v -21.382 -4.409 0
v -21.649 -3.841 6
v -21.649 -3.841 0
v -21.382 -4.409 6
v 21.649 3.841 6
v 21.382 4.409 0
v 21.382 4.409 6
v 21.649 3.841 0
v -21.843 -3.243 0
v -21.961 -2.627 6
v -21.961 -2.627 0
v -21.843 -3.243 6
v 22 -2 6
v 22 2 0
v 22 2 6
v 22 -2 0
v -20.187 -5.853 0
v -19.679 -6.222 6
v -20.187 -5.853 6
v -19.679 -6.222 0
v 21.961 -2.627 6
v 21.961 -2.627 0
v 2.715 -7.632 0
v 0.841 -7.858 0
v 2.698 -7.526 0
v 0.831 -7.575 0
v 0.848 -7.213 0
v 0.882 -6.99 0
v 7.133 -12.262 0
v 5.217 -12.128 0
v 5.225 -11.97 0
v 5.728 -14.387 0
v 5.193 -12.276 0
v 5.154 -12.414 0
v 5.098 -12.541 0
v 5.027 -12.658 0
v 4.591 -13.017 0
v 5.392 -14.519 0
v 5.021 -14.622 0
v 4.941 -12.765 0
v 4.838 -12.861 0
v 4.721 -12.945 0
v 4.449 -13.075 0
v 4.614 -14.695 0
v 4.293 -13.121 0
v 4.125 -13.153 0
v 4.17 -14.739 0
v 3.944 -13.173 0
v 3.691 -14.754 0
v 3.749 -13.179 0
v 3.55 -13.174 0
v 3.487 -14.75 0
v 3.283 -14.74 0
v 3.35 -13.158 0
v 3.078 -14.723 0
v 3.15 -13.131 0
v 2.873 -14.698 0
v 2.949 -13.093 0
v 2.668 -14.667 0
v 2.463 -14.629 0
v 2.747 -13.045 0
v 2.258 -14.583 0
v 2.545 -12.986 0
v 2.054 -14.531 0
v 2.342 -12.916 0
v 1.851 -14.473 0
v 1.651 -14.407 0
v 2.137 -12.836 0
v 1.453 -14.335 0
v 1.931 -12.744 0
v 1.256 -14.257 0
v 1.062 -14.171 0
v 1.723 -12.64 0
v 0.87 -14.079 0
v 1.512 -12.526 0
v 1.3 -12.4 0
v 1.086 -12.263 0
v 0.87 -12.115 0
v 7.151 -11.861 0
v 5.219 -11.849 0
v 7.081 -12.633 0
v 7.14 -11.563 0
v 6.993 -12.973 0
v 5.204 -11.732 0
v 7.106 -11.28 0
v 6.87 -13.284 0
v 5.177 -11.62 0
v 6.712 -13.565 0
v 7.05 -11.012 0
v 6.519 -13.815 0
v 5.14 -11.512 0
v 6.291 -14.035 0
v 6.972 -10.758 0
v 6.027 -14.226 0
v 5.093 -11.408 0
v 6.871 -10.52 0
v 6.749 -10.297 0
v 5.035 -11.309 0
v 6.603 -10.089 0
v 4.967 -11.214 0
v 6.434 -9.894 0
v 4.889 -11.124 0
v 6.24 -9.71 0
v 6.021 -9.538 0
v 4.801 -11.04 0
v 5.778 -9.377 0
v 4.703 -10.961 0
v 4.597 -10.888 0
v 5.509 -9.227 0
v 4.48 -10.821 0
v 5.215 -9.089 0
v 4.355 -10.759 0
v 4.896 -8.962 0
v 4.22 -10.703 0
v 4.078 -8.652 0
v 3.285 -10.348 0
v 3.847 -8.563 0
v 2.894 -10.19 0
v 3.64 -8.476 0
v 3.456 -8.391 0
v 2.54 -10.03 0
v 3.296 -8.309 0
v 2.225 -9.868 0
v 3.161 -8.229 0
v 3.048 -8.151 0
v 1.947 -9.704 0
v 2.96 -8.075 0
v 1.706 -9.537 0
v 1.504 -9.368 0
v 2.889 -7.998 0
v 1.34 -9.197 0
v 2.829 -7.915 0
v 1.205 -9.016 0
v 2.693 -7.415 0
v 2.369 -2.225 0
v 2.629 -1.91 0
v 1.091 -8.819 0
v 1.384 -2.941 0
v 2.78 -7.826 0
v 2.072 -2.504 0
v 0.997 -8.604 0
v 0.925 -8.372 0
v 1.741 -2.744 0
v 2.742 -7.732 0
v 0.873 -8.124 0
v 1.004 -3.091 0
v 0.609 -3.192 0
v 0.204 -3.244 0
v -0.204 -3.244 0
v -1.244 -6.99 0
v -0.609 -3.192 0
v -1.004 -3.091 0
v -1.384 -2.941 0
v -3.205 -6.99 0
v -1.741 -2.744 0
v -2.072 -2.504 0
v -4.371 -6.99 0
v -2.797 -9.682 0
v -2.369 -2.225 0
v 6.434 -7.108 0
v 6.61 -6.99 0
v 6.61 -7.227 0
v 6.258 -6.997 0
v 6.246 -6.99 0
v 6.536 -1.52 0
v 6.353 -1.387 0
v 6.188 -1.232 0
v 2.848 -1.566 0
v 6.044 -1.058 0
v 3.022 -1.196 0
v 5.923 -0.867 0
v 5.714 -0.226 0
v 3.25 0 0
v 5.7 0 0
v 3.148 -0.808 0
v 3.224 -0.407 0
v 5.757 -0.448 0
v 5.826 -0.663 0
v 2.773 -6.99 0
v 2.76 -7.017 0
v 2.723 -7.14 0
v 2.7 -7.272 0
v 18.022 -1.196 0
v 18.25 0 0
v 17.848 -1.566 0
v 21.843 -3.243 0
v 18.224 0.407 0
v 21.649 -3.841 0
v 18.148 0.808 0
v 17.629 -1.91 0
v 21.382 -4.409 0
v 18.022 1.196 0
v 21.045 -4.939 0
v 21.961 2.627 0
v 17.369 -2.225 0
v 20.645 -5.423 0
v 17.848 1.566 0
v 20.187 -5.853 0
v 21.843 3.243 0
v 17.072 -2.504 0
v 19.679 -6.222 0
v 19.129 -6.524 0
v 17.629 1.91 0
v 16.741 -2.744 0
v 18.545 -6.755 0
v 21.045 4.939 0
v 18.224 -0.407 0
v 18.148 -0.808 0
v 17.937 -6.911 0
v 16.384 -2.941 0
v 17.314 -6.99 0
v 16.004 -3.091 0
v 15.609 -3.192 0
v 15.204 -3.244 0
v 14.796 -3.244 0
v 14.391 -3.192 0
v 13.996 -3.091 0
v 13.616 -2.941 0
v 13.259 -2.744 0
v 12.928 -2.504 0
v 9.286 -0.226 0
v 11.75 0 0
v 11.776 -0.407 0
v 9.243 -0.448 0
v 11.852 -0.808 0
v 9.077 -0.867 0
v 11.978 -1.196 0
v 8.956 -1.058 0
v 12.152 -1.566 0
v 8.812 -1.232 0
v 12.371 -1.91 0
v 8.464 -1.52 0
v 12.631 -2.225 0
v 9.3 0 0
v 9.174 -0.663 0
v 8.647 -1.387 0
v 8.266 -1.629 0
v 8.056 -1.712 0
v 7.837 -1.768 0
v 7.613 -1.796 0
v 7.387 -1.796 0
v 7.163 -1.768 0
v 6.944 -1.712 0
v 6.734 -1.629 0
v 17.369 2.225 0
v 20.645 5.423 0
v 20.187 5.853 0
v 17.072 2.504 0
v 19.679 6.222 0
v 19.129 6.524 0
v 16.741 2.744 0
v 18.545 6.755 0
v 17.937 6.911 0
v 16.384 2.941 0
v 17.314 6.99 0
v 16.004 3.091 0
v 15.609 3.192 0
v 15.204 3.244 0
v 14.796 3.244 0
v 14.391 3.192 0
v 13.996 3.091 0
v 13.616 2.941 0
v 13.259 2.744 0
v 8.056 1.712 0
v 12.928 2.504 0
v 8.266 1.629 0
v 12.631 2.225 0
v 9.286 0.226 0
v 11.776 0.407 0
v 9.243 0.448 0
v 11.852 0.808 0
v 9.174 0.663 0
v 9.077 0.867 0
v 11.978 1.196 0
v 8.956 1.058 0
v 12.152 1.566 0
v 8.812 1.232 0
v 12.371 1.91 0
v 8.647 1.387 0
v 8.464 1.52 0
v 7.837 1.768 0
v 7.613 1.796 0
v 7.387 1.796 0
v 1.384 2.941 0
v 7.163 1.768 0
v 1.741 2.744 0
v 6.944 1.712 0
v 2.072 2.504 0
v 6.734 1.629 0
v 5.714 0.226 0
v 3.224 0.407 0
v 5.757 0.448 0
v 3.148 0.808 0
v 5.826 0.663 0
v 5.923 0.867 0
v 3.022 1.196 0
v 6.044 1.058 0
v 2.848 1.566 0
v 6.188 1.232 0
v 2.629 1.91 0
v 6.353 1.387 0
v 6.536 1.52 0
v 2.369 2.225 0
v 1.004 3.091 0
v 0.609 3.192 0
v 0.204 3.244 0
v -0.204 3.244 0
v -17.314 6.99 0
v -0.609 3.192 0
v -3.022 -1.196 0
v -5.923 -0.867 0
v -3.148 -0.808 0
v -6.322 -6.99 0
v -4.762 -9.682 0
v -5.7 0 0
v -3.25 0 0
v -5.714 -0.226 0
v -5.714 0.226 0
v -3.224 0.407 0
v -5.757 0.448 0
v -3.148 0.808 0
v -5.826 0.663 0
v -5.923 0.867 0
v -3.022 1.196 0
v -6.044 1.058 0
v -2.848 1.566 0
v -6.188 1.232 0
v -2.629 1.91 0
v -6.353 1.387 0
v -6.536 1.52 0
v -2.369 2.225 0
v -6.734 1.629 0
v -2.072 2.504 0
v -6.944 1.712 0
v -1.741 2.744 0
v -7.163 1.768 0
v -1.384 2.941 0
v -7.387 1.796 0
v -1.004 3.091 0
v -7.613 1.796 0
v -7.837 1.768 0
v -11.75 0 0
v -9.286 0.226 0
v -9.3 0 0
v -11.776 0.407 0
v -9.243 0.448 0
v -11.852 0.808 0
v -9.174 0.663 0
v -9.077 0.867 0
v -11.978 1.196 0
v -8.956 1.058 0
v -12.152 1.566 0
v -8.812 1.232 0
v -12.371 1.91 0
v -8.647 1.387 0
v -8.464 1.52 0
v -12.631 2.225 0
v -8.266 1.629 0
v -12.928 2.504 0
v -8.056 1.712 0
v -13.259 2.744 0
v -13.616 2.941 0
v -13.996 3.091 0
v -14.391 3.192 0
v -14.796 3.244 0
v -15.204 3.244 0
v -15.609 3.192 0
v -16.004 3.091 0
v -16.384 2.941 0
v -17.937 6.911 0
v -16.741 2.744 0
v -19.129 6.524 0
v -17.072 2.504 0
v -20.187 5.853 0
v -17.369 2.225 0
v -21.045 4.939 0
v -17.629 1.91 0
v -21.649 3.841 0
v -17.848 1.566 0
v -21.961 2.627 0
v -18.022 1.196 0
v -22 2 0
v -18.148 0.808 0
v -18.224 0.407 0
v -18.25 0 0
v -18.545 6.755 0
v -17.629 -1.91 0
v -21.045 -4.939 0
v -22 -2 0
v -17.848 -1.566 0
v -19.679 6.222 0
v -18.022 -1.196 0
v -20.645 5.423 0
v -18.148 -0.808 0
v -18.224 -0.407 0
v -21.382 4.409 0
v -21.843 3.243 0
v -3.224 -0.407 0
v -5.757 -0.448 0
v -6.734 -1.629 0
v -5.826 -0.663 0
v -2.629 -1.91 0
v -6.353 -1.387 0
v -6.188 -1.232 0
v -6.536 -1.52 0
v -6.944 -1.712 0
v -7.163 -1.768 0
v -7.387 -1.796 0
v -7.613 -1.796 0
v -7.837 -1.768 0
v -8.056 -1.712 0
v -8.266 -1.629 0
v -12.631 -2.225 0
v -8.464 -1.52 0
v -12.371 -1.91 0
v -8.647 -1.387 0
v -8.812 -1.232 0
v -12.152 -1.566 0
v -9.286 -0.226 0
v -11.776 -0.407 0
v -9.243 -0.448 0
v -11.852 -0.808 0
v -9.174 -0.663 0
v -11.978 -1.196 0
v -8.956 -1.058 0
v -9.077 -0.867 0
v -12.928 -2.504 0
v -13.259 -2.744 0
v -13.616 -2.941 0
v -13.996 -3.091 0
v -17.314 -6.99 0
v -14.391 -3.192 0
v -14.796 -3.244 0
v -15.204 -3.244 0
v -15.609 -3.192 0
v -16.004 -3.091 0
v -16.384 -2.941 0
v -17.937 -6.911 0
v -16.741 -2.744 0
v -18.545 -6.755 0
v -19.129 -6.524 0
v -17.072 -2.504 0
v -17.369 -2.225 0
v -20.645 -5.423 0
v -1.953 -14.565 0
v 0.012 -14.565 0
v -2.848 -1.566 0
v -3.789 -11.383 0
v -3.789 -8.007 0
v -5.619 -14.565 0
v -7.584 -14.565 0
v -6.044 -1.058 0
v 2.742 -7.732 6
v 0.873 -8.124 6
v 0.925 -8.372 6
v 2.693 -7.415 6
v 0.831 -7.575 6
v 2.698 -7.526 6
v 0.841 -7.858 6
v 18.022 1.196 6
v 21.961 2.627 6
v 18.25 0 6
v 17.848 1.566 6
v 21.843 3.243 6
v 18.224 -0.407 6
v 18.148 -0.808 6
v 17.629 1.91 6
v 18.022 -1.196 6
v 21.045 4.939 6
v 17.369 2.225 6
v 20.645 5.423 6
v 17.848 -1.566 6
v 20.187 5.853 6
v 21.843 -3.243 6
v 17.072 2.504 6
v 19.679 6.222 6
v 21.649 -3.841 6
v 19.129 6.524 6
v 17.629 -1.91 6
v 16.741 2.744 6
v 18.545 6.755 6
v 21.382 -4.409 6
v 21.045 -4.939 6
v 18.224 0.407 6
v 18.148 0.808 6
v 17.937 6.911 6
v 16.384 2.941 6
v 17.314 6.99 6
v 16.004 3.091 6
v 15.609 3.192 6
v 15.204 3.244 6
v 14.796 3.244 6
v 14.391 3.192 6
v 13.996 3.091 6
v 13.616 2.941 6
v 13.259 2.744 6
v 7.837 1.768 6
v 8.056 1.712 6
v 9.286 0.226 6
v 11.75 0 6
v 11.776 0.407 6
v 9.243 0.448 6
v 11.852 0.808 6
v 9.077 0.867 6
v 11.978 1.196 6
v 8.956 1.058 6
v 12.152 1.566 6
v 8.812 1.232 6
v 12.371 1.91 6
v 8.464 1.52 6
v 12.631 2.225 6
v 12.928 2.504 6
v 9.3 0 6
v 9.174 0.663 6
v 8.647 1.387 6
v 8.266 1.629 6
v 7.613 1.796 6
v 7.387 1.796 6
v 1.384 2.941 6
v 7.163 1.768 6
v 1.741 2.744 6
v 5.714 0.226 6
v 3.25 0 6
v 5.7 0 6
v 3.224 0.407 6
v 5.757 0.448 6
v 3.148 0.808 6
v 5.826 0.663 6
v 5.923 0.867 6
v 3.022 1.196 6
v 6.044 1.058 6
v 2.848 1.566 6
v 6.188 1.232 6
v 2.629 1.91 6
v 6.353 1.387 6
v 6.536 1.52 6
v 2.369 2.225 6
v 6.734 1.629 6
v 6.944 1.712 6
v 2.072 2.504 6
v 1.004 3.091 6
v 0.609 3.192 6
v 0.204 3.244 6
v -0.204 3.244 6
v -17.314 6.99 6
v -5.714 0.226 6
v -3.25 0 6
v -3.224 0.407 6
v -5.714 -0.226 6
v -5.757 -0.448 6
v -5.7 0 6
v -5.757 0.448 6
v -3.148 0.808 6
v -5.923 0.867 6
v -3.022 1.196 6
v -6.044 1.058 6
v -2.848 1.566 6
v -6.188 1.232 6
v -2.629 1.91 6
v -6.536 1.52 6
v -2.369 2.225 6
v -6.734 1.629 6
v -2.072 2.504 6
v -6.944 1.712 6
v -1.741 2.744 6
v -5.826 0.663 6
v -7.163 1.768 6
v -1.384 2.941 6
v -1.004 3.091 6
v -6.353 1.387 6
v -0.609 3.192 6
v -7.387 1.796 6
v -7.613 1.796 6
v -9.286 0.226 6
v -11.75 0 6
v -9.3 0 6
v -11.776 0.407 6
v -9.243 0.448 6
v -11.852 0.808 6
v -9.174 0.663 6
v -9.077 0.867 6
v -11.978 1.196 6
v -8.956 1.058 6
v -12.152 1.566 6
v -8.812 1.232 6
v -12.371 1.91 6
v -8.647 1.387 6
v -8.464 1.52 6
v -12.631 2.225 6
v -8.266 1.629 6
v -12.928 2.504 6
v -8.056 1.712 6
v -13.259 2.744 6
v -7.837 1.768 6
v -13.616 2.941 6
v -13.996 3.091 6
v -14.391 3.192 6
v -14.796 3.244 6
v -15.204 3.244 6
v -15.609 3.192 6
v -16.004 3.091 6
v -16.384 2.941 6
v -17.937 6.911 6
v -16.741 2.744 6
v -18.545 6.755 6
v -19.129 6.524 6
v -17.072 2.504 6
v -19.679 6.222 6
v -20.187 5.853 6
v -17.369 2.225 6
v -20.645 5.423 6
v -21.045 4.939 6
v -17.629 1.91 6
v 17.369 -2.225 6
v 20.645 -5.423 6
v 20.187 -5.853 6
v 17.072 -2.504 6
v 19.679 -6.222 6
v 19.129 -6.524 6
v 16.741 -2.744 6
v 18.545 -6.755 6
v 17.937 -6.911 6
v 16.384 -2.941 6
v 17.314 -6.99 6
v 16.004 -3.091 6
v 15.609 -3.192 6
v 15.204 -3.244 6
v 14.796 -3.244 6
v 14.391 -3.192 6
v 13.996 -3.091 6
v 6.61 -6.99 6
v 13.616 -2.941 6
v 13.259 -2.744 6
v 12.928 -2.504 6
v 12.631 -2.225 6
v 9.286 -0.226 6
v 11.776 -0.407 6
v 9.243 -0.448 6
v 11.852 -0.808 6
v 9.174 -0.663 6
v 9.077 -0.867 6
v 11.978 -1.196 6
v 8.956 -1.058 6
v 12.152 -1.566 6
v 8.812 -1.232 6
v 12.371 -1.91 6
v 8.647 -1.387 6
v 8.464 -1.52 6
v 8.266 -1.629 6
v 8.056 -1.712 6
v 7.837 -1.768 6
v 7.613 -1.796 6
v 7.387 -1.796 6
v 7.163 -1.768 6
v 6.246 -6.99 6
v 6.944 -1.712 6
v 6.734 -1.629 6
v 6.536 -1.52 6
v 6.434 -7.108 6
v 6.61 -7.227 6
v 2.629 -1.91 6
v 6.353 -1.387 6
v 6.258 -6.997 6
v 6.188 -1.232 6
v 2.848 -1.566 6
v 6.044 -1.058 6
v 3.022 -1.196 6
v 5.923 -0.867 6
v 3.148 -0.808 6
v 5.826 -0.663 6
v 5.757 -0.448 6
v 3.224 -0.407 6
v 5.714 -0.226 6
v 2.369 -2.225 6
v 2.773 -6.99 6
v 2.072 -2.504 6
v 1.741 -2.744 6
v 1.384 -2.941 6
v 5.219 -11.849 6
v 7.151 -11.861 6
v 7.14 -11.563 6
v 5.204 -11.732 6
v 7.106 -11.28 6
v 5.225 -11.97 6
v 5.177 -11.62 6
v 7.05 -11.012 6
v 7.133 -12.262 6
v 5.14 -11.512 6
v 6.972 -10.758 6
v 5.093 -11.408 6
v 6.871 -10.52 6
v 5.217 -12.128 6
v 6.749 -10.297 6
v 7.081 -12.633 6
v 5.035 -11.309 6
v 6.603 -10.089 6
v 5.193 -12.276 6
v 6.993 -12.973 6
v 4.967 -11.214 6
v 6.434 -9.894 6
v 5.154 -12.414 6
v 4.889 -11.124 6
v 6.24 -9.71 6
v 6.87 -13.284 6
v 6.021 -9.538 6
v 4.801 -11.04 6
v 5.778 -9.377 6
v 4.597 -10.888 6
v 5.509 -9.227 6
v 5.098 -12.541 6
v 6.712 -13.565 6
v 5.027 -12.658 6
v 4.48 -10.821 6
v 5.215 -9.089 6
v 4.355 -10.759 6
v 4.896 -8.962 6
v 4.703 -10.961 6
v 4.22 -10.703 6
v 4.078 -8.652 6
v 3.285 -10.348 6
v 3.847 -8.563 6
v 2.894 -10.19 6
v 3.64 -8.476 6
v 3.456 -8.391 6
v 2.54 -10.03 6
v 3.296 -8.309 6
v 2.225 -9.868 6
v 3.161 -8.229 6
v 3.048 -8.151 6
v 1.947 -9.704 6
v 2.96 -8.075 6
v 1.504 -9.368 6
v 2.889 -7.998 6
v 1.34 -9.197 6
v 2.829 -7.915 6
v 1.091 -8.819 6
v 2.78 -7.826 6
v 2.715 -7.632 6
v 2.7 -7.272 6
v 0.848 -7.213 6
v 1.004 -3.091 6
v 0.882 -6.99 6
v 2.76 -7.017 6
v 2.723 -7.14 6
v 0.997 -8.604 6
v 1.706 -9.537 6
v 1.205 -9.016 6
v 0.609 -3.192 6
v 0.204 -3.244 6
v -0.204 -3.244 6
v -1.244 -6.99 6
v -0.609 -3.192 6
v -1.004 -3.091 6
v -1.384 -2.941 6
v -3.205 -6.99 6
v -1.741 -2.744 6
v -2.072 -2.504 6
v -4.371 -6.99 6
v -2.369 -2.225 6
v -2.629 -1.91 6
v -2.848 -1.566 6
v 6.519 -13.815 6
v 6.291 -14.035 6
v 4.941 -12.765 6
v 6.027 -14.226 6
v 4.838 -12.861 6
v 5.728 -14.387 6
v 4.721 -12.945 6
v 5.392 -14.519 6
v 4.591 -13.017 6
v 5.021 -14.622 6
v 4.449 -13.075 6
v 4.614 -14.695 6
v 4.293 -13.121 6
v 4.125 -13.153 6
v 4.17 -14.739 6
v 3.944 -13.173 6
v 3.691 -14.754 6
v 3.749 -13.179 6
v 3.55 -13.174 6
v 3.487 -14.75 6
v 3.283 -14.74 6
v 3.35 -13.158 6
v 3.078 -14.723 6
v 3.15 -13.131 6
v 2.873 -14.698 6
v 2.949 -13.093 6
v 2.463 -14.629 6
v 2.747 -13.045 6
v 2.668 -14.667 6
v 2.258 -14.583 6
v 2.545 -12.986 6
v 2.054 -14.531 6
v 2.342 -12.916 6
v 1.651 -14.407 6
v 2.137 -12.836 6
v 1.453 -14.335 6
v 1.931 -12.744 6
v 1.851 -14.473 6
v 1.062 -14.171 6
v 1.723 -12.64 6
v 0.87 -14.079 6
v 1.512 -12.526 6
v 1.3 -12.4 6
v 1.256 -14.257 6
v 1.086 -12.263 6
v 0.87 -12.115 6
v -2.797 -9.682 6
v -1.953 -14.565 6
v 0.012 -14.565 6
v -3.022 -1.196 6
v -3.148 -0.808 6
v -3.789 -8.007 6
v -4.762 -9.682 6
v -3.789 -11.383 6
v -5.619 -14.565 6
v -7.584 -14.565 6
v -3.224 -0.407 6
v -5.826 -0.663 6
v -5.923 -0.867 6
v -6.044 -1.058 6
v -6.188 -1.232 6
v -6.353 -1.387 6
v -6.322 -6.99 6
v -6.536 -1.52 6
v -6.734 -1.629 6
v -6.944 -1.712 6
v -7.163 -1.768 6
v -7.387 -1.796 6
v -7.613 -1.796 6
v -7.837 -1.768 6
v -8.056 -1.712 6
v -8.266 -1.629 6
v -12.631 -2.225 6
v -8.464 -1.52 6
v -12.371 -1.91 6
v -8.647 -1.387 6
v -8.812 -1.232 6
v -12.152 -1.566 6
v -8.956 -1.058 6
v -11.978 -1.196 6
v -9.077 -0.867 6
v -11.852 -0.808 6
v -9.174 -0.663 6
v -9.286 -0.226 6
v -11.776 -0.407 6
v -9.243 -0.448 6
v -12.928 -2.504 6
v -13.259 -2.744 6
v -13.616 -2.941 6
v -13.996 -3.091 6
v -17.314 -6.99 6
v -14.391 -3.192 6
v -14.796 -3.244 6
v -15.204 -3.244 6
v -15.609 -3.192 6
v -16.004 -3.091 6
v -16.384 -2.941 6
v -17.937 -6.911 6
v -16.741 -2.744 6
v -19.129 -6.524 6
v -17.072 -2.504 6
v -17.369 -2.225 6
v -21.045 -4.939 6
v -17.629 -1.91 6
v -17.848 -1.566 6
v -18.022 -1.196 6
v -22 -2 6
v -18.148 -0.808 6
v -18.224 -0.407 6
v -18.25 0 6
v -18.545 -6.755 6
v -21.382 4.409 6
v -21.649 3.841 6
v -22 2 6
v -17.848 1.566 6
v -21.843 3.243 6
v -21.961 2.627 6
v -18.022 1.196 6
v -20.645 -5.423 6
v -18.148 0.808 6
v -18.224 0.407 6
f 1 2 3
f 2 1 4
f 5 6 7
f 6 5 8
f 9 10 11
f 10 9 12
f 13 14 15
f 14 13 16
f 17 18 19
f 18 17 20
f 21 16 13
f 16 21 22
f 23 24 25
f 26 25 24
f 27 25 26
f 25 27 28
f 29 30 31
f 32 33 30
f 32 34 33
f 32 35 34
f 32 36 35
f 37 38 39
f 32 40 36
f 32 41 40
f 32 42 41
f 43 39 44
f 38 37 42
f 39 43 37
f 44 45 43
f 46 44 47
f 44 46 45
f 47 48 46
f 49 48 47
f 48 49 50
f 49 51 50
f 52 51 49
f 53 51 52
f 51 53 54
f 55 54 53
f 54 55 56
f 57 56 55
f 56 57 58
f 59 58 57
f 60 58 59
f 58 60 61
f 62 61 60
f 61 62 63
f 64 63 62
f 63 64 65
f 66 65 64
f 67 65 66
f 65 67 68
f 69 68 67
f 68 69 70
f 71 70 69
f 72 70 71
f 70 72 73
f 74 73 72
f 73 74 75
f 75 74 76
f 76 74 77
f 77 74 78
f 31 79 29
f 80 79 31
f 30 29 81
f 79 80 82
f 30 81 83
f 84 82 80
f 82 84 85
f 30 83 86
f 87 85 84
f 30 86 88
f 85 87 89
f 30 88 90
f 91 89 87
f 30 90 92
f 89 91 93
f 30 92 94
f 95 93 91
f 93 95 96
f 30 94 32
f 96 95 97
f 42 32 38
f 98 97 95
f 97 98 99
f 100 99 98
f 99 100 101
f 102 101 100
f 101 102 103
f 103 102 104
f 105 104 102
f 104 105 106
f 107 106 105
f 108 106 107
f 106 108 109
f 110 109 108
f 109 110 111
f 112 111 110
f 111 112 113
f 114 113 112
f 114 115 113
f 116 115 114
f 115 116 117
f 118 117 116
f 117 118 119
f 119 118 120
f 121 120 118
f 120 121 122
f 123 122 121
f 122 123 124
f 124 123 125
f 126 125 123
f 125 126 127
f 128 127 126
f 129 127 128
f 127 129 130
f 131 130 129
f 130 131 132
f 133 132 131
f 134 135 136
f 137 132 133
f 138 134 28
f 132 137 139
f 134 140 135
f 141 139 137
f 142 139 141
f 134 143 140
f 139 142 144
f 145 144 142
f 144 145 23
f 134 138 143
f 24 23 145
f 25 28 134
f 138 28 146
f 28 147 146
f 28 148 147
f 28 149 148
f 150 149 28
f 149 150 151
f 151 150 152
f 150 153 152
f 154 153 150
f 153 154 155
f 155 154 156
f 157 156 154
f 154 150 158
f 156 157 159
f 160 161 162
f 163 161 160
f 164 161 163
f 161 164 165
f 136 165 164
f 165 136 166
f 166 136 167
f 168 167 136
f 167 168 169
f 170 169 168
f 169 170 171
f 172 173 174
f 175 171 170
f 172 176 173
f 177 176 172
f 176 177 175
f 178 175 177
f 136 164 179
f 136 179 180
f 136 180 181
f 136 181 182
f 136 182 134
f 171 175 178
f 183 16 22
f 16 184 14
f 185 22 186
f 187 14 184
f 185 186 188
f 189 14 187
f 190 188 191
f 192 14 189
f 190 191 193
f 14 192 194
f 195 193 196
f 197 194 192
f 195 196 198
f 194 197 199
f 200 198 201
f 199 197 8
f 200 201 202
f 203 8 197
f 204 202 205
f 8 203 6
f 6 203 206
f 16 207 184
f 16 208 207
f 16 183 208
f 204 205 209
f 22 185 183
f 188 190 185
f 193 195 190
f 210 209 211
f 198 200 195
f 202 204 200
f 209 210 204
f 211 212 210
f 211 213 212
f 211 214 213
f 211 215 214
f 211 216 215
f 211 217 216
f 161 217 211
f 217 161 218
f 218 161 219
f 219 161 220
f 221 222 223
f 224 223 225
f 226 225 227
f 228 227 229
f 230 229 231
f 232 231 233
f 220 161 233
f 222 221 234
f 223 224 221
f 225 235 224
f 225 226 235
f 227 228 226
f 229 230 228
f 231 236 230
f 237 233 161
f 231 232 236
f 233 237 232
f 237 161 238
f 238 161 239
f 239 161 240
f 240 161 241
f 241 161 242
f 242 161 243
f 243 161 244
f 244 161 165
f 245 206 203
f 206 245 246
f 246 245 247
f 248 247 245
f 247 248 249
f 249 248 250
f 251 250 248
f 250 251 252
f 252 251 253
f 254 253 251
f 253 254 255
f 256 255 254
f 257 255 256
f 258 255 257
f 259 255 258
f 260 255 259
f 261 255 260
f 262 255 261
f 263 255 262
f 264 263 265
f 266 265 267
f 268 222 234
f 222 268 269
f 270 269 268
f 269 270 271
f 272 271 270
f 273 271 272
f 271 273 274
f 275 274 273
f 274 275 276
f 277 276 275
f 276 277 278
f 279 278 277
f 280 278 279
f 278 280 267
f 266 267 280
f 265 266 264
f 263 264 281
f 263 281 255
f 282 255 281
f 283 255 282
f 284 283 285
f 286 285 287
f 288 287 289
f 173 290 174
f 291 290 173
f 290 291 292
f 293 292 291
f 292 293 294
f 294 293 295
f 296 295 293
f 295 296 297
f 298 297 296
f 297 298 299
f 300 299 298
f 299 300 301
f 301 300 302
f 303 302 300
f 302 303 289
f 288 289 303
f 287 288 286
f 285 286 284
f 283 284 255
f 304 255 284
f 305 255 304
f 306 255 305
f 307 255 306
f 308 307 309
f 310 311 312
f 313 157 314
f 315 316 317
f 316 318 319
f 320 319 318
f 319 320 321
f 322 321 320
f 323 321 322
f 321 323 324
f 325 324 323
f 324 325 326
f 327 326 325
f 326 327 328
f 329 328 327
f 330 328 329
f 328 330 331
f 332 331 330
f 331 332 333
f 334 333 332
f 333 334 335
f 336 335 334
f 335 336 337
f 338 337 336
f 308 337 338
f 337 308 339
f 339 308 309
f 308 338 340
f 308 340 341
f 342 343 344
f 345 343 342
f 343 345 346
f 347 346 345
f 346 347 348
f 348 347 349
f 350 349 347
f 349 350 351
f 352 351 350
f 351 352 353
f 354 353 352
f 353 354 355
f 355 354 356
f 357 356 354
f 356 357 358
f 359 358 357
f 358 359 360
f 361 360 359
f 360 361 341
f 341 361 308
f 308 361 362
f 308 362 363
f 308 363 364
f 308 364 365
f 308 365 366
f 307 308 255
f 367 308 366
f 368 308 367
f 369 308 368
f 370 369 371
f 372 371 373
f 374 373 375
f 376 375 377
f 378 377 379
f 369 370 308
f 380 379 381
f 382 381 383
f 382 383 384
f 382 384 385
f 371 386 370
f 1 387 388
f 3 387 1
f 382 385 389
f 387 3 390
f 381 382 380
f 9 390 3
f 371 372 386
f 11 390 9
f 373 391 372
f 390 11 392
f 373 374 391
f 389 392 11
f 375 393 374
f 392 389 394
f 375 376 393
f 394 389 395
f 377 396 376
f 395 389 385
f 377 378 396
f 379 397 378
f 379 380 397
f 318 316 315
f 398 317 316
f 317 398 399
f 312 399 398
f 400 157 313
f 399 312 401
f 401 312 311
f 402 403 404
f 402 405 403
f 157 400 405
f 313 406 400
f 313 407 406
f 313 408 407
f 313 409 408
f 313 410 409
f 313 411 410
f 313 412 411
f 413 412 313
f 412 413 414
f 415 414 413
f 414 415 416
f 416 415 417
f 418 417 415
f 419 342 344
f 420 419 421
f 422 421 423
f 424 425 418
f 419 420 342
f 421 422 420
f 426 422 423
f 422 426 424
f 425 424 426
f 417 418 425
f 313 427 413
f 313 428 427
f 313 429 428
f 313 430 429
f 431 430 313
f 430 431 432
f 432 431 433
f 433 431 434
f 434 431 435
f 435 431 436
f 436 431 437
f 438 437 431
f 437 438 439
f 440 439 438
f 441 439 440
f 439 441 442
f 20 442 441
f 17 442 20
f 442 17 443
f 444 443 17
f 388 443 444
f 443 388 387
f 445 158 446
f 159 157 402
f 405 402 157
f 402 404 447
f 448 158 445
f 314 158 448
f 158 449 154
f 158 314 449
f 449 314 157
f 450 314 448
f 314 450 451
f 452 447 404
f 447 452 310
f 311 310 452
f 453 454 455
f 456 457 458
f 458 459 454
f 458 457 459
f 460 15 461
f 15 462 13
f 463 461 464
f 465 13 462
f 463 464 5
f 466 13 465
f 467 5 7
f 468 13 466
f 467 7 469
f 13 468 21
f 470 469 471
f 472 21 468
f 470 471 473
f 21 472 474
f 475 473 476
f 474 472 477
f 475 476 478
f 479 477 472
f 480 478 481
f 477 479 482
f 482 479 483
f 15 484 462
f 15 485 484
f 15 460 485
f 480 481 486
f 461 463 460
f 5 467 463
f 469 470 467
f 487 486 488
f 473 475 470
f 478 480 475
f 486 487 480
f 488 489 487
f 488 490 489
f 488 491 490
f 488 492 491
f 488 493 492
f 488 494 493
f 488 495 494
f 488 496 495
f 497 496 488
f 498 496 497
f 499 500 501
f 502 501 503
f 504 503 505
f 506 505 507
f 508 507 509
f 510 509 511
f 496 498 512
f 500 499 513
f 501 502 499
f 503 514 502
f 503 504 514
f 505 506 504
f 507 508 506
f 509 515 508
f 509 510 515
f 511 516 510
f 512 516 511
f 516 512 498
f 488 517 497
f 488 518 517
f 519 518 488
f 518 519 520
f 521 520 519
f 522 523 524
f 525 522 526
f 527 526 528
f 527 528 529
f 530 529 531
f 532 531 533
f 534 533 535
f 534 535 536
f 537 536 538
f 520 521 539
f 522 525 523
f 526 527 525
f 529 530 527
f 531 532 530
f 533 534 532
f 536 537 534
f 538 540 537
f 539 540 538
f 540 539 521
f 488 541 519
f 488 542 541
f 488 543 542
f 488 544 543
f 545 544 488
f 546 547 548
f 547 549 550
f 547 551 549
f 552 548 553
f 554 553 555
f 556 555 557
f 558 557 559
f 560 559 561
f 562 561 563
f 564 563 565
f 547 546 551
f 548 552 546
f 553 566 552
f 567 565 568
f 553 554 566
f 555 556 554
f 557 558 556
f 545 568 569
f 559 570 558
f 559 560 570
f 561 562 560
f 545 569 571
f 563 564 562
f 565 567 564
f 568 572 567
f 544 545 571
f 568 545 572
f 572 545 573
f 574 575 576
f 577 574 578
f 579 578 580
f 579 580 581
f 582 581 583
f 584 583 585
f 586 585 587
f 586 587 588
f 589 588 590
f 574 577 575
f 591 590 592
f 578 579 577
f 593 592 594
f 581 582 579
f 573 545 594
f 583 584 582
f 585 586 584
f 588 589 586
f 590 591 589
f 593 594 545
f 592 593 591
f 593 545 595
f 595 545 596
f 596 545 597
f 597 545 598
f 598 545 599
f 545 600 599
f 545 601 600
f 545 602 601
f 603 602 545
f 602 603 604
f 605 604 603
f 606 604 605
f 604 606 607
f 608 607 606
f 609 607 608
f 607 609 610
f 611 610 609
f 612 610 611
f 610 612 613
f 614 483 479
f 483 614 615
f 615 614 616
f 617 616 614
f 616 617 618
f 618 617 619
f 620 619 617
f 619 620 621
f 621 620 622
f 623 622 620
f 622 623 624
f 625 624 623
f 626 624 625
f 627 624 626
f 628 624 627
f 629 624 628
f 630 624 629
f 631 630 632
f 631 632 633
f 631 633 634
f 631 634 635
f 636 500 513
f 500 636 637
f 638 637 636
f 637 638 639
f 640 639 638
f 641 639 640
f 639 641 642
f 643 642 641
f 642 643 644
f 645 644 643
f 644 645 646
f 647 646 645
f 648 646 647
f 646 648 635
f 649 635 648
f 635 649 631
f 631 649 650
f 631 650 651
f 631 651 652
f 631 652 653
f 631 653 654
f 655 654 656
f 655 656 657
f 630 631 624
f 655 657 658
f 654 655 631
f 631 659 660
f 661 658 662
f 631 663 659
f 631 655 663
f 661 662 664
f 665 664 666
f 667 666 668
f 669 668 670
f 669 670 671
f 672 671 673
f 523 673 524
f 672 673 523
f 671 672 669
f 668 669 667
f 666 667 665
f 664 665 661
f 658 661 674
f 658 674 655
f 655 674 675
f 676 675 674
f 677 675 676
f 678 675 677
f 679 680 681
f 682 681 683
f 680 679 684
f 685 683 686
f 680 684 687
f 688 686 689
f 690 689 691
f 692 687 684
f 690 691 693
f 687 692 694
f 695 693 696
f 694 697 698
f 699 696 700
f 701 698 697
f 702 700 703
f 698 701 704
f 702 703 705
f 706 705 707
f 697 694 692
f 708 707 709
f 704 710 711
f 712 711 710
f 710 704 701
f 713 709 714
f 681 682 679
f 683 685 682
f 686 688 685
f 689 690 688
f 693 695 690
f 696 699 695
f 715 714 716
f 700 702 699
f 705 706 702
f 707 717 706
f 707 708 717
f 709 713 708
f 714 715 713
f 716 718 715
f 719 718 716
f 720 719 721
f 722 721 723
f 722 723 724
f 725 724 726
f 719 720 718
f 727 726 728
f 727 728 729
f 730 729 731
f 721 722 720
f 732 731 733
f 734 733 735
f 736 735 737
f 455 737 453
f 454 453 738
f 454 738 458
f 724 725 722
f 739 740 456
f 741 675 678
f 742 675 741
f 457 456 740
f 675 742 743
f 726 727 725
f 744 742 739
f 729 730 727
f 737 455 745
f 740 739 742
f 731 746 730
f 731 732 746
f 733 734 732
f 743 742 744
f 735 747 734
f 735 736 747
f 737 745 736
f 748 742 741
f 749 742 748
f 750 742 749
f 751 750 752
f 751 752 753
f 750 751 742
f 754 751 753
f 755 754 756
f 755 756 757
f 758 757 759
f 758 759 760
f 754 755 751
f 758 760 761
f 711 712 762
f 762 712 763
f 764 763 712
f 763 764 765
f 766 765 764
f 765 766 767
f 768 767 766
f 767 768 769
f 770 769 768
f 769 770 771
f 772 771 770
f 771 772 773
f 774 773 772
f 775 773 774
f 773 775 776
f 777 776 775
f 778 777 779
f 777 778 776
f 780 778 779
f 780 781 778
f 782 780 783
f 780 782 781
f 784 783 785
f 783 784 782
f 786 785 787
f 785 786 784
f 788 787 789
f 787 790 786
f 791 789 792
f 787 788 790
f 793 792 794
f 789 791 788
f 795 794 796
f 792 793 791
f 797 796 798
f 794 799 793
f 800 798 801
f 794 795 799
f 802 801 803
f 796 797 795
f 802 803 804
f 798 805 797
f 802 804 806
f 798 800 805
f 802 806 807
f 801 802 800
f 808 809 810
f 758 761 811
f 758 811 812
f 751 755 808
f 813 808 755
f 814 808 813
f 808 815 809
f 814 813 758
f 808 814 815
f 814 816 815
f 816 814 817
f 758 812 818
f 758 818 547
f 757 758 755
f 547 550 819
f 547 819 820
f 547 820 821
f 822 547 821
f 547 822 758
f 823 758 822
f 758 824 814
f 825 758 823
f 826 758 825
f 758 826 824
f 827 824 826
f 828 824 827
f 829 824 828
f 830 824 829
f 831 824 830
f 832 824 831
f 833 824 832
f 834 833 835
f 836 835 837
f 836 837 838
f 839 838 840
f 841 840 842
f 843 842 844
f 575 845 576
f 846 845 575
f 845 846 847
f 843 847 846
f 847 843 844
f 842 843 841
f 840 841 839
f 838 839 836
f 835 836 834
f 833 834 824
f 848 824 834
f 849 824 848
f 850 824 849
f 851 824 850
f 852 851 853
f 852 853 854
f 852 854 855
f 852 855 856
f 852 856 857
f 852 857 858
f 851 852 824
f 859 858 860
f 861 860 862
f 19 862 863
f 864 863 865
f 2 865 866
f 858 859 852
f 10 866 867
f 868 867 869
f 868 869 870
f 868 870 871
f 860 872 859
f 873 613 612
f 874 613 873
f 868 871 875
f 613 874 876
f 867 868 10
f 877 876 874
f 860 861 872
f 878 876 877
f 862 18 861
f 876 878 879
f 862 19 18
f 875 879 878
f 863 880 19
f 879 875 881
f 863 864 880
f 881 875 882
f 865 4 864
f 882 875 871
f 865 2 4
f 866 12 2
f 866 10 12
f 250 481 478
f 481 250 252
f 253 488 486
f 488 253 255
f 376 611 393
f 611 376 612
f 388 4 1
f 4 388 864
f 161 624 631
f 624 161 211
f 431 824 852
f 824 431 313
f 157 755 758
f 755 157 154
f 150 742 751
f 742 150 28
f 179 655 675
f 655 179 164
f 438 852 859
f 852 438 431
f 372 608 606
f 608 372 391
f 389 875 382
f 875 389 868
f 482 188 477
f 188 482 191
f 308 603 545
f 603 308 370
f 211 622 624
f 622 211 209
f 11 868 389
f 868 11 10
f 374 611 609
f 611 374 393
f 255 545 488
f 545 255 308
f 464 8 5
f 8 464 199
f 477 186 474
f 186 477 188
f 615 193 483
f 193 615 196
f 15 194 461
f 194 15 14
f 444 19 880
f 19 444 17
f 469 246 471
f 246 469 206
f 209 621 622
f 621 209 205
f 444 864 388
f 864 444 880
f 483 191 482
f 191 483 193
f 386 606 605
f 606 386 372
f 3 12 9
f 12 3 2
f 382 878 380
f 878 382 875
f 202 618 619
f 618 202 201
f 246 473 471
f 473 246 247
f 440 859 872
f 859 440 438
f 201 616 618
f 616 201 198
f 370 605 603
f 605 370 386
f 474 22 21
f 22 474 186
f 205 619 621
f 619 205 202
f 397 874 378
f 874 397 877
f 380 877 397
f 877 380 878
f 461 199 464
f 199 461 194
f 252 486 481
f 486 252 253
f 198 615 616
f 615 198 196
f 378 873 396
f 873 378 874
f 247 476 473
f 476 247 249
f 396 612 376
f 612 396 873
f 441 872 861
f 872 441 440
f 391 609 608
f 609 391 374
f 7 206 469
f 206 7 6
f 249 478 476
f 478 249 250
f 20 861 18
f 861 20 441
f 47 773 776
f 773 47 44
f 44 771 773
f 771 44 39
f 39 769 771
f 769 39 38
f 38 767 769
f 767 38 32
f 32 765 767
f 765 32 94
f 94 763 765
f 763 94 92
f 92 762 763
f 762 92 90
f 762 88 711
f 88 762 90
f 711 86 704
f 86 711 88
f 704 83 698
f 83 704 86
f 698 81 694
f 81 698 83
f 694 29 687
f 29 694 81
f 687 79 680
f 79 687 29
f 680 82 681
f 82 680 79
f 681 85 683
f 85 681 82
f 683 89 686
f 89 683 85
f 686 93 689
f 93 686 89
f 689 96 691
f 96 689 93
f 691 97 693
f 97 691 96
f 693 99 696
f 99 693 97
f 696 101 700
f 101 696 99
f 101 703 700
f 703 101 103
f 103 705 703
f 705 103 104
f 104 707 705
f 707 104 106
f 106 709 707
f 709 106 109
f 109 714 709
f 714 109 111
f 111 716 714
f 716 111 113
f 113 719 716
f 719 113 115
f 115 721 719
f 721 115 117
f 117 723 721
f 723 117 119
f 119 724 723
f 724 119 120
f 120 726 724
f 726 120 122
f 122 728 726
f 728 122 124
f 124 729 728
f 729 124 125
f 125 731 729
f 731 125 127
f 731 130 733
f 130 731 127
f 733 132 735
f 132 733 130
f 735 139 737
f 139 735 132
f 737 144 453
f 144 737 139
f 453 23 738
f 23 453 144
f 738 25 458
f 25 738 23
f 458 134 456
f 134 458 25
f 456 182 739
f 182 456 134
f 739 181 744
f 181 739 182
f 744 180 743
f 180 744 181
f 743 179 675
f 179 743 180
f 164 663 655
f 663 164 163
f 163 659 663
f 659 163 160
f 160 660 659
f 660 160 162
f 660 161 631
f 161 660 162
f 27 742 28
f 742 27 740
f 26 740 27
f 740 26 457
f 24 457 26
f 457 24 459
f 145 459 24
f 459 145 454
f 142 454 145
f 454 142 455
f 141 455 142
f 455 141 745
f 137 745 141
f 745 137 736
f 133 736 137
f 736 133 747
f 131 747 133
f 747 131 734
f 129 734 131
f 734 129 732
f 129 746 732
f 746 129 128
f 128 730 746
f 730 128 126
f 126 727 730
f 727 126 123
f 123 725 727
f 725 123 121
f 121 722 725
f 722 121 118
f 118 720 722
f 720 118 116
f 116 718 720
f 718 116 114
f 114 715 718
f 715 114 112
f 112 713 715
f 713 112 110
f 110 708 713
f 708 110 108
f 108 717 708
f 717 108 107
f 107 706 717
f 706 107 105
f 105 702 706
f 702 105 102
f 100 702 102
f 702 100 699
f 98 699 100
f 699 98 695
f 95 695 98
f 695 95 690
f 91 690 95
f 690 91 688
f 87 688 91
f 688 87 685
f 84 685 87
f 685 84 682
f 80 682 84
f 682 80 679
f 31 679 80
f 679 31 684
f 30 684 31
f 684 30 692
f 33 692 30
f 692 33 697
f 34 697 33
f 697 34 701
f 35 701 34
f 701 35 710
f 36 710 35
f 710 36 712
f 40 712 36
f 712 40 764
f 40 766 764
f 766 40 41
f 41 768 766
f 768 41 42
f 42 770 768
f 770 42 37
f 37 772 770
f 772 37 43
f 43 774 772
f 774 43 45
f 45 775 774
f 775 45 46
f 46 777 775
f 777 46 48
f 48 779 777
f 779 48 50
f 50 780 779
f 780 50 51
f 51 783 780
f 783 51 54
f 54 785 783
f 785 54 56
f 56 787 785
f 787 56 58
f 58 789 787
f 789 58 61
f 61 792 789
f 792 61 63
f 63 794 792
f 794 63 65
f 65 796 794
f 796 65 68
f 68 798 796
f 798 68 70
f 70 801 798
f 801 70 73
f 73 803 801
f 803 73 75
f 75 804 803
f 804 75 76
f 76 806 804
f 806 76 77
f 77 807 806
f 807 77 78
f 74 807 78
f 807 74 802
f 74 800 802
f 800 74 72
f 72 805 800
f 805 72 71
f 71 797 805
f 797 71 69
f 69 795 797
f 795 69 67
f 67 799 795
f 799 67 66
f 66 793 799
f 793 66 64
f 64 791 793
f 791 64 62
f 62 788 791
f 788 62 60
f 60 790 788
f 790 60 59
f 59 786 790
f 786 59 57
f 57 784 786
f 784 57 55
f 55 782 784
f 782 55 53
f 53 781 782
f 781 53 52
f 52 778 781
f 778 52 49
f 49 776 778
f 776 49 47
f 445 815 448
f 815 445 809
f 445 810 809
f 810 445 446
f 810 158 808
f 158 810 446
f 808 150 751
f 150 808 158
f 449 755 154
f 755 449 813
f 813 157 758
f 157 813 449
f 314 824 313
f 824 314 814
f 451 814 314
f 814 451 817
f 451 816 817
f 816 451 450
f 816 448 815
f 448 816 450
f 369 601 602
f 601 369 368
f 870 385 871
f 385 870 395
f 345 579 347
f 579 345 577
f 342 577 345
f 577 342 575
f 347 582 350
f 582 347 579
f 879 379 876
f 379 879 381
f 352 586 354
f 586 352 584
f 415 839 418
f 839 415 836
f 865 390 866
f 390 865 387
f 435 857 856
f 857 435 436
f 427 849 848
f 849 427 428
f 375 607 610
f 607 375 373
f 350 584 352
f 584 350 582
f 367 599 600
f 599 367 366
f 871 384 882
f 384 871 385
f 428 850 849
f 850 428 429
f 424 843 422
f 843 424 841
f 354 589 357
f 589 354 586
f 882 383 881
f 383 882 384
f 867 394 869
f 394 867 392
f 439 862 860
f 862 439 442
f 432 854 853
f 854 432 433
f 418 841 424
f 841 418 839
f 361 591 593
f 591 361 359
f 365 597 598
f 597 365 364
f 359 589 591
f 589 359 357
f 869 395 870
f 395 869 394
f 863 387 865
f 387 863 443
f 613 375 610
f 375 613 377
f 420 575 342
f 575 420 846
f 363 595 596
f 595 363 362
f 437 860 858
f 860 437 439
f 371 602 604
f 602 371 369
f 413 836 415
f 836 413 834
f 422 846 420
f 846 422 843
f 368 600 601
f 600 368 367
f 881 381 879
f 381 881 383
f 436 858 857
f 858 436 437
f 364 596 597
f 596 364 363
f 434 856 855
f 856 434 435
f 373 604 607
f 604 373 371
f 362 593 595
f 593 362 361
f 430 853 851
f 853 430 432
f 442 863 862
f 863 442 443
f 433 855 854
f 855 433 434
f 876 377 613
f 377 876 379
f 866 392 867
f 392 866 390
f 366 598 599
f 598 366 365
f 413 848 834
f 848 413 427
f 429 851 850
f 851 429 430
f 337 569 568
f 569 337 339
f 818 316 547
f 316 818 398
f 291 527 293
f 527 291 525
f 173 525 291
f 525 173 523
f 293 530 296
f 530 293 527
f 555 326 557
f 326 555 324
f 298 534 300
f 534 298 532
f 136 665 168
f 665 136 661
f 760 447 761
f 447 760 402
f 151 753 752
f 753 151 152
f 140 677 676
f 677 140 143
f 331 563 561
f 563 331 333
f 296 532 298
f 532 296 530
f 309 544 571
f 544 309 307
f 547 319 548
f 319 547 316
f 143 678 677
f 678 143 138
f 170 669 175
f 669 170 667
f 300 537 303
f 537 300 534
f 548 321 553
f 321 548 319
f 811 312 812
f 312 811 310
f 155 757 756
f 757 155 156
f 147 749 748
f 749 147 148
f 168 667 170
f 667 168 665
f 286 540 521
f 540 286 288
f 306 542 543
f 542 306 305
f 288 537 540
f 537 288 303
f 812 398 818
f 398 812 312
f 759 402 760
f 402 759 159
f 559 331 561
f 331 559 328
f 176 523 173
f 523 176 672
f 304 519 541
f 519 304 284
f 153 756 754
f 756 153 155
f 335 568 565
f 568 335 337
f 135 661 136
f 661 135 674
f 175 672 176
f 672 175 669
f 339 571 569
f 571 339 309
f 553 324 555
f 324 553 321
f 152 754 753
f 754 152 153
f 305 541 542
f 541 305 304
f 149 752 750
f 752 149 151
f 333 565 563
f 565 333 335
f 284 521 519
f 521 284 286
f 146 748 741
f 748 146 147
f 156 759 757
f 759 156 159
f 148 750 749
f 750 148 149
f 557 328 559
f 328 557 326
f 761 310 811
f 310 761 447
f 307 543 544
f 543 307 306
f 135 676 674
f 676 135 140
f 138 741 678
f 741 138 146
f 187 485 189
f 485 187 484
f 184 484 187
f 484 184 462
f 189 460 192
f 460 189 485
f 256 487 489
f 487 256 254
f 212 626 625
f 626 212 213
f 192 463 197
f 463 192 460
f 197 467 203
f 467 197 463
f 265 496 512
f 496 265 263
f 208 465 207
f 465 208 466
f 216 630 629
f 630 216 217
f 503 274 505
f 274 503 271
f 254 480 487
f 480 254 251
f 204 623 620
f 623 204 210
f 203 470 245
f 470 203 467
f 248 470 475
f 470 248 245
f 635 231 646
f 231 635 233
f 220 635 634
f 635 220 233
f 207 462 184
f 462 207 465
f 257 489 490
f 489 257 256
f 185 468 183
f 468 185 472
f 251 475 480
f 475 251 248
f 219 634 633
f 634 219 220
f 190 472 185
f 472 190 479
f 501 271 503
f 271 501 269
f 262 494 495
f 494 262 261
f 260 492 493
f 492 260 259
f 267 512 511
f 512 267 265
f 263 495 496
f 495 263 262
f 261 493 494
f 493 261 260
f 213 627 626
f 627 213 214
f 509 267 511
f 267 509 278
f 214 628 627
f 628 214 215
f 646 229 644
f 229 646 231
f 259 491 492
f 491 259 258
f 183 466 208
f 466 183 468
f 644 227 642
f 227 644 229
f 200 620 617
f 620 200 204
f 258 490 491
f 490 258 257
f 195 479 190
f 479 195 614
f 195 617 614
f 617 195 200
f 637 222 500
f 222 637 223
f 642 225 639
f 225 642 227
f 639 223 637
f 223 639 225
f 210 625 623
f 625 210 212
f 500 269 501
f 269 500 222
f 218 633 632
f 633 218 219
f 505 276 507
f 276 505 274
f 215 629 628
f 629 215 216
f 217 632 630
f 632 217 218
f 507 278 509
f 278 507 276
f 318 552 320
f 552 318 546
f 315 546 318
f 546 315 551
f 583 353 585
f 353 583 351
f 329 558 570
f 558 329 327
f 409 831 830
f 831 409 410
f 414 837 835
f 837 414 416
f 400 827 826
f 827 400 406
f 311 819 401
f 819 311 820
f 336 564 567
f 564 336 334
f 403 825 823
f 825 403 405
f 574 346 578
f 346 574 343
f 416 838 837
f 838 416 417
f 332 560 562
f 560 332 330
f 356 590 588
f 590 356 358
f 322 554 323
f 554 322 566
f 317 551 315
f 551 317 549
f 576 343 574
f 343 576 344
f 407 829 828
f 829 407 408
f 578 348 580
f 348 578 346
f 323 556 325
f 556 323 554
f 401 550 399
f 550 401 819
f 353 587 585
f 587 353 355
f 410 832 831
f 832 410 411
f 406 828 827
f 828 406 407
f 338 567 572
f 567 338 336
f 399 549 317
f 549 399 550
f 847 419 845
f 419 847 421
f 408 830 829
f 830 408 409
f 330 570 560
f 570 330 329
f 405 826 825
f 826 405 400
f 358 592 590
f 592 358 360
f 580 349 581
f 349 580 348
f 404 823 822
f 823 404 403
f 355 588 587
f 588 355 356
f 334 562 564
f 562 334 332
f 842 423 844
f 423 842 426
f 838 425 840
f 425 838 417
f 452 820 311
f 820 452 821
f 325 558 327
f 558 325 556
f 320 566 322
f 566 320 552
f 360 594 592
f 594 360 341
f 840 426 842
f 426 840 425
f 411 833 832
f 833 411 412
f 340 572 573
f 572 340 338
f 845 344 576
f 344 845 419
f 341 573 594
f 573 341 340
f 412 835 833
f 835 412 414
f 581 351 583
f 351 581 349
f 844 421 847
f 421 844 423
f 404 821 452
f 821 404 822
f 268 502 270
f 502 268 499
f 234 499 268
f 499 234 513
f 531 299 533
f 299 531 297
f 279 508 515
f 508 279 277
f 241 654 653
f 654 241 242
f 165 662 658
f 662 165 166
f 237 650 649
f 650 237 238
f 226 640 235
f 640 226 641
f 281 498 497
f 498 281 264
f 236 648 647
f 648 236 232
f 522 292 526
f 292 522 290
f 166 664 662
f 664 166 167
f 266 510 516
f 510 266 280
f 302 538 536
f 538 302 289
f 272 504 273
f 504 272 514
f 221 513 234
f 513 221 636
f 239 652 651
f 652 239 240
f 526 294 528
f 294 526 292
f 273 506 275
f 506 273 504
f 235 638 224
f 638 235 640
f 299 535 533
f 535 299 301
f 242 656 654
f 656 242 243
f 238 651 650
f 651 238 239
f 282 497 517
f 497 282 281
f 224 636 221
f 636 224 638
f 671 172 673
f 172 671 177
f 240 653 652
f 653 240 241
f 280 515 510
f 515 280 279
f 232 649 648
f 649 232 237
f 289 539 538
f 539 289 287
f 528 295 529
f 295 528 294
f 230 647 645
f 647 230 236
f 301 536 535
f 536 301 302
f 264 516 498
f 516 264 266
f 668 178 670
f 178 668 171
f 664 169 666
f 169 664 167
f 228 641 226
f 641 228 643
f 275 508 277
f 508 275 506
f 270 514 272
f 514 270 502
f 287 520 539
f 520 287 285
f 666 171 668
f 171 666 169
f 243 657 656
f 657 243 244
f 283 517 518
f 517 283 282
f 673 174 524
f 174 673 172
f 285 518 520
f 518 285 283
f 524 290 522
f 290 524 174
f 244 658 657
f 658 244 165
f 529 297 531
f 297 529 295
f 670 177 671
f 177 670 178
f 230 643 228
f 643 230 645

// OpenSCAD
$fn = 50;


difference() {
	union() {
		hull() {
			translate(v = [-17.0000000000, 2.0000000000, 0]) {
				cylinder(h = 6, r = 5);
			}
			translate(v = [17.0000000000, 2.0000000000, 0]) {
				cylinder(h = 6, r = 5);
			}
			translate(v = [-17.0000000000, -2.0000000000, 0]) {
				cylinder(h = 6, r = 5);
			}
			translate(v = [17.0000000000, -2.0000000000, 0]) {
				cylinder(h = 6, r = 5);
			}
		}
		translate(v = [0, -5, 0]) {
			linear_extrude(height = 6) {
				text(font = "DejaVu Sans Mono:style=Bold", halign = "center", size = 9.5000000000, text = "XS", valign = "top");
			}
		}
	}
	union() {
		translate(v = [-15.0000000000, 0.0000000000, 0]) {
			translate(v = [0, 0, -100]) {
				cylinder(h = 200, r = 3.2500000000);
			}
		}
		translate(v = [0, 0, -100]) {
			cylinder(h = 200, r = 3.2500000000);
		}
		translate(v = [15.0000000000, 0.0000000000, 0]) {
			translate(v = [0, 0, -100]) {
				cylinder(h = 200, r = 3.2500000000);
			}
		}
		translate(v = [-15.0000000000, 0.0000000000, 0]) {
			translate(v = [0, 0, -100]) {
				cylinder(h = 200, r = 1.8000000000);
			}
		}
		translate(v = [-7.5000000000, 0.0000000000, 0]) {
			translate(v = [0, 0, -100]) {
				cylinder(h = 200, r = 1.8000000000);
			}
		}
		translate(v = [0, 0, -100]) {
			cylinder(h = 200, r = 1.8000000000);
		}
		translate(v = [7.5000000000, 0.0000000000, 0]) {
			translate(v = [0, 0, -100]) {
				cylinder(h = 200, r = 1.8000000000);
			}
		}
		translate(v = [15.0000000000, 0.0000000000, 0]) {
			translate(v = [0, 0, -100]) {
				cylinder(h = 200, r = 1.8000000000);
			}
		}
	}
}
